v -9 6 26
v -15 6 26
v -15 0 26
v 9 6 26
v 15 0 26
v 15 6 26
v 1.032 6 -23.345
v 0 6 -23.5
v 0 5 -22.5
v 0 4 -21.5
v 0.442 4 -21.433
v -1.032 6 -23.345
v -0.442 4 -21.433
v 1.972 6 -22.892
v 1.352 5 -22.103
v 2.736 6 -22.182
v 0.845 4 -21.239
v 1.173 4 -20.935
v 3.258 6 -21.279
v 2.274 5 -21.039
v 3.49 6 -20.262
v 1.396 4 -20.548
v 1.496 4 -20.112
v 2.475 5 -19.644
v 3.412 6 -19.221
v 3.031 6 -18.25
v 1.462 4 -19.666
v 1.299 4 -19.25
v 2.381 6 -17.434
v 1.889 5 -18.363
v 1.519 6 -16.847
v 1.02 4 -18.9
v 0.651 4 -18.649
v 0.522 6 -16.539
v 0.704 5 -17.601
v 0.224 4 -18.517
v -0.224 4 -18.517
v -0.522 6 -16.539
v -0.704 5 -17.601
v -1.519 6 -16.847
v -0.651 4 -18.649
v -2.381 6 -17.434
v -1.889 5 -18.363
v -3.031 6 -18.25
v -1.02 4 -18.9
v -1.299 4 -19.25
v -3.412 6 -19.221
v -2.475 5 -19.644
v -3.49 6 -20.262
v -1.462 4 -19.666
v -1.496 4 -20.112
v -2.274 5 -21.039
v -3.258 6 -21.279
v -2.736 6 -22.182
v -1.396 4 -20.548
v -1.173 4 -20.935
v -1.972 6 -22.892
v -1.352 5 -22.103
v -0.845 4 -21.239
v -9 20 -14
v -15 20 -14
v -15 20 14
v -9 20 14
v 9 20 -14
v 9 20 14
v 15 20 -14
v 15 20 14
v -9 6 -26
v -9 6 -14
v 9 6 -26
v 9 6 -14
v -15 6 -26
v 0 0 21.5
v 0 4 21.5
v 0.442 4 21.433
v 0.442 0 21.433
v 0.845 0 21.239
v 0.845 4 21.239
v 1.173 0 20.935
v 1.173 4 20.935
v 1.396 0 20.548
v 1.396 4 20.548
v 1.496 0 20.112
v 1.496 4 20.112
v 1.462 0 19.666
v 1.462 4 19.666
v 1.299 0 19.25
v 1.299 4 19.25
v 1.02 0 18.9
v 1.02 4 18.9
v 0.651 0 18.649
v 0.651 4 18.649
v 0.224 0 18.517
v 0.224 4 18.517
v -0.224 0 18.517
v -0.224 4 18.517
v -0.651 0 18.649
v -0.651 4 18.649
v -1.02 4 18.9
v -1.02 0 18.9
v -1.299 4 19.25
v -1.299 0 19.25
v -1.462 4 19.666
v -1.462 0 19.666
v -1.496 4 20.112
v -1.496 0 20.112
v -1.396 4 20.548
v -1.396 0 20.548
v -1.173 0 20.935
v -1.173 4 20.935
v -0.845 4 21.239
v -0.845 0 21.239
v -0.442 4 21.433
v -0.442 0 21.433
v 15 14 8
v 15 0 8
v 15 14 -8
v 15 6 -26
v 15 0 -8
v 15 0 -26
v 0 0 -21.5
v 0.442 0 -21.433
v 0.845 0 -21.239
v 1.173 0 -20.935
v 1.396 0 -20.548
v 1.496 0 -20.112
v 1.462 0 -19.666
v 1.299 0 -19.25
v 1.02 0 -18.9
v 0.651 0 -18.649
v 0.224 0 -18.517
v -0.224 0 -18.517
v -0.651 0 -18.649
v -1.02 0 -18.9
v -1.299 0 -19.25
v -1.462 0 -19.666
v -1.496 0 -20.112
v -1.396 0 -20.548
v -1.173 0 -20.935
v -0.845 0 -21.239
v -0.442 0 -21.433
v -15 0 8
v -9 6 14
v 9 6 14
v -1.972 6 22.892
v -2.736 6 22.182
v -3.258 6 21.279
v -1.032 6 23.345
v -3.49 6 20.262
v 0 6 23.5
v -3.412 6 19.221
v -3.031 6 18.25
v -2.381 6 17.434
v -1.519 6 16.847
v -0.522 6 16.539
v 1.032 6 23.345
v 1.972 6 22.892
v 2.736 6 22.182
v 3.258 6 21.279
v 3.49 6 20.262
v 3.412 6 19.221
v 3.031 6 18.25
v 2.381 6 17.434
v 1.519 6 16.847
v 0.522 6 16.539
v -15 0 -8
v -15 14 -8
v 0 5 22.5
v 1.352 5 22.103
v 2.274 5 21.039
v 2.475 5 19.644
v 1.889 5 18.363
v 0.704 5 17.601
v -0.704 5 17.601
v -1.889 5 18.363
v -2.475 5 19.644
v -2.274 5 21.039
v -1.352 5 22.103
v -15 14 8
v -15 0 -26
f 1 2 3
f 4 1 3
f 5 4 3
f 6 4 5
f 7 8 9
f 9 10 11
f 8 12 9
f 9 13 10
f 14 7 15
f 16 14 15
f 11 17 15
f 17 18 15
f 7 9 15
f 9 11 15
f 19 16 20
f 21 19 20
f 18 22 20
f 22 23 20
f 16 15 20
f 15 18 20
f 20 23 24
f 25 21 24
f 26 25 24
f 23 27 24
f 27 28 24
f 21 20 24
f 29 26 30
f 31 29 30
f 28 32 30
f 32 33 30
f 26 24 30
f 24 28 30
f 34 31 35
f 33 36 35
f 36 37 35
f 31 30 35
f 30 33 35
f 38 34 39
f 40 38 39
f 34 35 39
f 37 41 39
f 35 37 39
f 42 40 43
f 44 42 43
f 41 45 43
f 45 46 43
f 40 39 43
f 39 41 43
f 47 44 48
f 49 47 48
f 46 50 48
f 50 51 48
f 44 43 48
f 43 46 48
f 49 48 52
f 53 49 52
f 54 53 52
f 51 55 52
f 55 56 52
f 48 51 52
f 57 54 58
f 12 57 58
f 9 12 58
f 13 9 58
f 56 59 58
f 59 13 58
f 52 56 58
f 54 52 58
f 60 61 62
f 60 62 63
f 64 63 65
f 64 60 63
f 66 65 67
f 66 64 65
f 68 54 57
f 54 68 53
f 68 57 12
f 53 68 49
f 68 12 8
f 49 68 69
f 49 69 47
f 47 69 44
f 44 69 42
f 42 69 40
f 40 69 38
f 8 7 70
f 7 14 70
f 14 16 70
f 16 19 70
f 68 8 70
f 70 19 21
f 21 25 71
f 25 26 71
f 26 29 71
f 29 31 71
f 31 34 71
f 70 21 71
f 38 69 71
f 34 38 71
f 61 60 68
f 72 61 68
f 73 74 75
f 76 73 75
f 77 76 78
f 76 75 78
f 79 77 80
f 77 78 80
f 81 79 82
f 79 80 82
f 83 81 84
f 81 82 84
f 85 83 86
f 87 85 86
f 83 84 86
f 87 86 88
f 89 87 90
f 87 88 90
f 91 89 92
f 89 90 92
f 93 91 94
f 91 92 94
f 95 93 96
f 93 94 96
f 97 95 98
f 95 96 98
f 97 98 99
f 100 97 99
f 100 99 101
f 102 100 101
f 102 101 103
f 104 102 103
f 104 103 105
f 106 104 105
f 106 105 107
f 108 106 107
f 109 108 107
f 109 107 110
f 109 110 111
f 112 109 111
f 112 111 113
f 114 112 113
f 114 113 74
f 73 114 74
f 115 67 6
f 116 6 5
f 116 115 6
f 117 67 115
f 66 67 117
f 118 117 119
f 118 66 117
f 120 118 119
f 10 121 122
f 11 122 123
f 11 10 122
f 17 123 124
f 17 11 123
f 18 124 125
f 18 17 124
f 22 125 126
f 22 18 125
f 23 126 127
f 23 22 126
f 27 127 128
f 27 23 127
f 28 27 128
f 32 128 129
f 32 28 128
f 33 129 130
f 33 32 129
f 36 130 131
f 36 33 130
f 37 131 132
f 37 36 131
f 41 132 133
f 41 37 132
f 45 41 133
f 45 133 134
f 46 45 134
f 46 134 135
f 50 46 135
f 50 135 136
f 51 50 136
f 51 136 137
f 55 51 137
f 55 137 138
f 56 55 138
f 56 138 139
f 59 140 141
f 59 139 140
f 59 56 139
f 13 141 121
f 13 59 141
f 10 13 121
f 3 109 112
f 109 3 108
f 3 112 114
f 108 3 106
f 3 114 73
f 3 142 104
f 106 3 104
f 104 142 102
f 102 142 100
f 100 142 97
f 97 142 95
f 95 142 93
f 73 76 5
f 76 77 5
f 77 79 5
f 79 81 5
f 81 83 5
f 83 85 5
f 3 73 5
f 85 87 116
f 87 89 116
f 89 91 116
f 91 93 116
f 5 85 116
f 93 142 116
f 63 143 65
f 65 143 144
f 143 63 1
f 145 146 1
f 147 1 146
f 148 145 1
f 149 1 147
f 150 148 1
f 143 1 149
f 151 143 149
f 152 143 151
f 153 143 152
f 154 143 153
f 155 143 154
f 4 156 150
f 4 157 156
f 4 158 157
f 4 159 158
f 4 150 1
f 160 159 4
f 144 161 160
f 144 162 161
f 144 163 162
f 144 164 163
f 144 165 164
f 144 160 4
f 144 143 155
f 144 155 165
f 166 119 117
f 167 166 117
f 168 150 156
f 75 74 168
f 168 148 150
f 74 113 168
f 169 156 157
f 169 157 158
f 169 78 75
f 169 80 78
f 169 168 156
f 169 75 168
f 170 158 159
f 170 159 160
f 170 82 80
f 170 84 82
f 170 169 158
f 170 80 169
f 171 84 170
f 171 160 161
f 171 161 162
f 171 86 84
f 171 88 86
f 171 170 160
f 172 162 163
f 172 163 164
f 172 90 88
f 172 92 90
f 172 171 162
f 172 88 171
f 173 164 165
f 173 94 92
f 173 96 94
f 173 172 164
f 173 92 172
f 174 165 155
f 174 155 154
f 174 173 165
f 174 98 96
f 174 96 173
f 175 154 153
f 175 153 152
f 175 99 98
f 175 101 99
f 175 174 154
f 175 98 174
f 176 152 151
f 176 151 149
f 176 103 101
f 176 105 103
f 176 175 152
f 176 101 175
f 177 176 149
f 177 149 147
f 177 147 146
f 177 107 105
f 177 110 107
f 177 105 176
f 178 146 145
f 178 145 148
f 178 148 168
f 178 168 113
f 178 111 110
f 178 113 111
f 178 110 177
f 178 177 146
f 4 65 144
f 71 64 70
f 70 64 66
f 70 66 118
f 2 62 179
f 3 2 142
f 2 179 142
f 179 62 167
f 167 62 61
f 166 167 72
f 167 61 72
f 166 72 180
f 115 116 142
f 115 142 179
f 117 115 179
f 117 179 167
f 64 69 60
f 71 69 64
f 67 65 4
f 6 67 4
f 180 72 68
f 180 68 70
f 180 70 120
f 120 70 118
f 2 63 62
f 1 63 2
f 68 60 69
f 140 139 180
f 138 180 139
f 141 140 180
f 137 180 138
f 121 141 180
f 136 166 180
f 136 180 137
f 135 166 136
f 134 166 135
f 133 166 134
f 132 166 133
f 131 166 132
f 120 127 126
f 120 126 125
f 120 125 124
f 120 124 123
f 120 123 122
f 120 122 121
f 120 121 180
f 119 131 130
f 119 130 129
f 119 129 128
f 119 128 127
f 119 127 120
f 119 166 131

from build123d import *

# Parameters (mm, degrees)
SKETCH1_W               = 30
SKETCH1_H               = 28
BOSS_EXTRUDE1_DEPTH     = 20
SKETCH2_W               = 16
SKETCH2_H               = 14
CUT_EXTRUDE1_DEPTH      = 39.678159212
SKETCH3_W               = 30
SKETCH3_H               = 6
BOSS_EXTRUDE2_DEPTH     = 12
RIB11_REACH             = 46.452
SKETCH4_WALL_W          = 109.343531998
SKETCH4_WALL_H          = 6
MIRROR2_COPY_1_REACH    = 46.452
MIRROR2_COPY_1_SKETCH_W = 109.343531998
MIRROR2_COPY_1_SKETCH_H = 6
SKETCH6_R               = 1.5
CUT_EXTRUDE2_DEPTH      = 34.120990323
CHAMFER1_SIZE           = 2
CHAMFER2_SIZE           = 2


with BuildPart() as part:
    # Sketch1 → Boss-Extrude1 (new body)
    with BuildSketch(Plane(origin=(0, 0, 0), x_dir=(1, 0, 0), z_dir=(0, 1, 0))):
        Rectangle(SKETCH1_W, SKETCH1_H)
    extrude(amount=BOSS_EXTRUDE1_DEPTH)

    # Sketch2 → Cut-Extrude1 (cut, through all)
    with BuildSketch(Plane(origin=(15, 0, 0), x_dir=(0, 0, -1), z_dir=(1, 0, 0))):
        with Locations((0, 7)):
            Rectangle(SKETCH2_W, SKETCH2_H)
    extrude(amount=-CUT_EXTRUDE1_DEPTH, mode=Mode.SUBTRACT)

    # Sketch3 → Boss-Extrude2 (add)
    with BuildSketch(Plane.XY.offset(14)):
        with Locations((0, 3)):
            Rectangle(SKETCH3_W, SKETCH3_H)
    boss_extrude2 = extrude(amount=BOSS_EXTRUDE2_DEPTH)

    # Sketch4 wall → Rib11 (add, up to next)
    with BuildSketch(Plane(origin=(15, 13, 20), x_dir=(0, -0.759256602365, 0.650791373456), z_dir=(0, -0.650791373456, -0.759256602365)), mode=Mode.PRIVATE) as rib11_sk1:
        with Locations((0, 3)):
            Rectangle(SKETCH4_WALL_W, SKETCH4_WALL_H)
    rib11_tool1 = extrude(rib11_sk1.sketch, amount=RIB11_REACH, mode=Mode.PRIVATE) - part.part
    rib11 = rib11_tool1.solids().sort_by_distance((15, 13, 20))[0]
    add(rib11)

    # Mirror1: Rib11 across plane
    add(rib11.mirror(Plane(origin=(0, 0, 0), x_dir=(0, 0, 1), z_dir=(1, 0, 0))))

    # Mirror2: Boss-Extrude2, Rib11 across plane
    add(boss_extrude2.mirror(Plane.XY))
    add(rib11.mirror(Plane.XY))

    # Mirror2 copy 1 sketch → Mirror2 copy 1 (add, up to next)
    with BuildSketch(Plane(origin=(-15, 13, -20), x_dir=(0, -0.759256602365, -0.650791373456), z_dir=(0, -0.650791373456, 0.759256602365)), mode=Mode.PRIVATE) as mirror2_copy_1_sk1:
        with Locations((0, 3)):
            Rectangle(MIRROR2_COPY_1_SKETCH_W, MIRROR2_COPY_1_SKETCH_H)
    mirror2_copy_1_tool1 = extrude(mirror2_copy_1_sk1.sketch, amount=MIRROR2_COPY_1_REACH, mode=Mode.PRIVATE) - part.part
    add(mirror2_copy_1_tool1.solids().sort_by_distance((-15, 13, -20))[0])

    # Sketch6 → Cut-Extrude2 (cut, through all)
    with BuildSketch(Plane(origin=(0, 6, 0), x_dir=(1, 0, 0), z_dir=(0, 1, 0))):
        with Locations(Location((0, -20, 0), (0, 0, 270))):
            Circle(SKETCH6_R)
    cut_extrude2 = extrude(amount=-CUT_EXTRUDE2_DEPTH, mode=Mode.SUBTRACT)

    # Chamfer1
    chamfer1_edges = [part.edges().sort_by_distance(p)[0] for p in [
        (0, 6, 18.5),
    ]]
    chamfer(chamfer1_edges, length=CHAMFER1_SIZE)

    # Mirror7: Cut-Extrude2 across plane
    add(cut_extrude2.mirror(Plane.XY), mode=Mode.SUBTRACT)

    # Chamfer2
    chamfer2_edges = [part.edges().sort_by_distance(p)[0] for p in [
        (0, 6, -18.5),
    ]]
    chamfer(chamfer2_edges, length=CHAMFER2_SIZE)


solid = part.part
